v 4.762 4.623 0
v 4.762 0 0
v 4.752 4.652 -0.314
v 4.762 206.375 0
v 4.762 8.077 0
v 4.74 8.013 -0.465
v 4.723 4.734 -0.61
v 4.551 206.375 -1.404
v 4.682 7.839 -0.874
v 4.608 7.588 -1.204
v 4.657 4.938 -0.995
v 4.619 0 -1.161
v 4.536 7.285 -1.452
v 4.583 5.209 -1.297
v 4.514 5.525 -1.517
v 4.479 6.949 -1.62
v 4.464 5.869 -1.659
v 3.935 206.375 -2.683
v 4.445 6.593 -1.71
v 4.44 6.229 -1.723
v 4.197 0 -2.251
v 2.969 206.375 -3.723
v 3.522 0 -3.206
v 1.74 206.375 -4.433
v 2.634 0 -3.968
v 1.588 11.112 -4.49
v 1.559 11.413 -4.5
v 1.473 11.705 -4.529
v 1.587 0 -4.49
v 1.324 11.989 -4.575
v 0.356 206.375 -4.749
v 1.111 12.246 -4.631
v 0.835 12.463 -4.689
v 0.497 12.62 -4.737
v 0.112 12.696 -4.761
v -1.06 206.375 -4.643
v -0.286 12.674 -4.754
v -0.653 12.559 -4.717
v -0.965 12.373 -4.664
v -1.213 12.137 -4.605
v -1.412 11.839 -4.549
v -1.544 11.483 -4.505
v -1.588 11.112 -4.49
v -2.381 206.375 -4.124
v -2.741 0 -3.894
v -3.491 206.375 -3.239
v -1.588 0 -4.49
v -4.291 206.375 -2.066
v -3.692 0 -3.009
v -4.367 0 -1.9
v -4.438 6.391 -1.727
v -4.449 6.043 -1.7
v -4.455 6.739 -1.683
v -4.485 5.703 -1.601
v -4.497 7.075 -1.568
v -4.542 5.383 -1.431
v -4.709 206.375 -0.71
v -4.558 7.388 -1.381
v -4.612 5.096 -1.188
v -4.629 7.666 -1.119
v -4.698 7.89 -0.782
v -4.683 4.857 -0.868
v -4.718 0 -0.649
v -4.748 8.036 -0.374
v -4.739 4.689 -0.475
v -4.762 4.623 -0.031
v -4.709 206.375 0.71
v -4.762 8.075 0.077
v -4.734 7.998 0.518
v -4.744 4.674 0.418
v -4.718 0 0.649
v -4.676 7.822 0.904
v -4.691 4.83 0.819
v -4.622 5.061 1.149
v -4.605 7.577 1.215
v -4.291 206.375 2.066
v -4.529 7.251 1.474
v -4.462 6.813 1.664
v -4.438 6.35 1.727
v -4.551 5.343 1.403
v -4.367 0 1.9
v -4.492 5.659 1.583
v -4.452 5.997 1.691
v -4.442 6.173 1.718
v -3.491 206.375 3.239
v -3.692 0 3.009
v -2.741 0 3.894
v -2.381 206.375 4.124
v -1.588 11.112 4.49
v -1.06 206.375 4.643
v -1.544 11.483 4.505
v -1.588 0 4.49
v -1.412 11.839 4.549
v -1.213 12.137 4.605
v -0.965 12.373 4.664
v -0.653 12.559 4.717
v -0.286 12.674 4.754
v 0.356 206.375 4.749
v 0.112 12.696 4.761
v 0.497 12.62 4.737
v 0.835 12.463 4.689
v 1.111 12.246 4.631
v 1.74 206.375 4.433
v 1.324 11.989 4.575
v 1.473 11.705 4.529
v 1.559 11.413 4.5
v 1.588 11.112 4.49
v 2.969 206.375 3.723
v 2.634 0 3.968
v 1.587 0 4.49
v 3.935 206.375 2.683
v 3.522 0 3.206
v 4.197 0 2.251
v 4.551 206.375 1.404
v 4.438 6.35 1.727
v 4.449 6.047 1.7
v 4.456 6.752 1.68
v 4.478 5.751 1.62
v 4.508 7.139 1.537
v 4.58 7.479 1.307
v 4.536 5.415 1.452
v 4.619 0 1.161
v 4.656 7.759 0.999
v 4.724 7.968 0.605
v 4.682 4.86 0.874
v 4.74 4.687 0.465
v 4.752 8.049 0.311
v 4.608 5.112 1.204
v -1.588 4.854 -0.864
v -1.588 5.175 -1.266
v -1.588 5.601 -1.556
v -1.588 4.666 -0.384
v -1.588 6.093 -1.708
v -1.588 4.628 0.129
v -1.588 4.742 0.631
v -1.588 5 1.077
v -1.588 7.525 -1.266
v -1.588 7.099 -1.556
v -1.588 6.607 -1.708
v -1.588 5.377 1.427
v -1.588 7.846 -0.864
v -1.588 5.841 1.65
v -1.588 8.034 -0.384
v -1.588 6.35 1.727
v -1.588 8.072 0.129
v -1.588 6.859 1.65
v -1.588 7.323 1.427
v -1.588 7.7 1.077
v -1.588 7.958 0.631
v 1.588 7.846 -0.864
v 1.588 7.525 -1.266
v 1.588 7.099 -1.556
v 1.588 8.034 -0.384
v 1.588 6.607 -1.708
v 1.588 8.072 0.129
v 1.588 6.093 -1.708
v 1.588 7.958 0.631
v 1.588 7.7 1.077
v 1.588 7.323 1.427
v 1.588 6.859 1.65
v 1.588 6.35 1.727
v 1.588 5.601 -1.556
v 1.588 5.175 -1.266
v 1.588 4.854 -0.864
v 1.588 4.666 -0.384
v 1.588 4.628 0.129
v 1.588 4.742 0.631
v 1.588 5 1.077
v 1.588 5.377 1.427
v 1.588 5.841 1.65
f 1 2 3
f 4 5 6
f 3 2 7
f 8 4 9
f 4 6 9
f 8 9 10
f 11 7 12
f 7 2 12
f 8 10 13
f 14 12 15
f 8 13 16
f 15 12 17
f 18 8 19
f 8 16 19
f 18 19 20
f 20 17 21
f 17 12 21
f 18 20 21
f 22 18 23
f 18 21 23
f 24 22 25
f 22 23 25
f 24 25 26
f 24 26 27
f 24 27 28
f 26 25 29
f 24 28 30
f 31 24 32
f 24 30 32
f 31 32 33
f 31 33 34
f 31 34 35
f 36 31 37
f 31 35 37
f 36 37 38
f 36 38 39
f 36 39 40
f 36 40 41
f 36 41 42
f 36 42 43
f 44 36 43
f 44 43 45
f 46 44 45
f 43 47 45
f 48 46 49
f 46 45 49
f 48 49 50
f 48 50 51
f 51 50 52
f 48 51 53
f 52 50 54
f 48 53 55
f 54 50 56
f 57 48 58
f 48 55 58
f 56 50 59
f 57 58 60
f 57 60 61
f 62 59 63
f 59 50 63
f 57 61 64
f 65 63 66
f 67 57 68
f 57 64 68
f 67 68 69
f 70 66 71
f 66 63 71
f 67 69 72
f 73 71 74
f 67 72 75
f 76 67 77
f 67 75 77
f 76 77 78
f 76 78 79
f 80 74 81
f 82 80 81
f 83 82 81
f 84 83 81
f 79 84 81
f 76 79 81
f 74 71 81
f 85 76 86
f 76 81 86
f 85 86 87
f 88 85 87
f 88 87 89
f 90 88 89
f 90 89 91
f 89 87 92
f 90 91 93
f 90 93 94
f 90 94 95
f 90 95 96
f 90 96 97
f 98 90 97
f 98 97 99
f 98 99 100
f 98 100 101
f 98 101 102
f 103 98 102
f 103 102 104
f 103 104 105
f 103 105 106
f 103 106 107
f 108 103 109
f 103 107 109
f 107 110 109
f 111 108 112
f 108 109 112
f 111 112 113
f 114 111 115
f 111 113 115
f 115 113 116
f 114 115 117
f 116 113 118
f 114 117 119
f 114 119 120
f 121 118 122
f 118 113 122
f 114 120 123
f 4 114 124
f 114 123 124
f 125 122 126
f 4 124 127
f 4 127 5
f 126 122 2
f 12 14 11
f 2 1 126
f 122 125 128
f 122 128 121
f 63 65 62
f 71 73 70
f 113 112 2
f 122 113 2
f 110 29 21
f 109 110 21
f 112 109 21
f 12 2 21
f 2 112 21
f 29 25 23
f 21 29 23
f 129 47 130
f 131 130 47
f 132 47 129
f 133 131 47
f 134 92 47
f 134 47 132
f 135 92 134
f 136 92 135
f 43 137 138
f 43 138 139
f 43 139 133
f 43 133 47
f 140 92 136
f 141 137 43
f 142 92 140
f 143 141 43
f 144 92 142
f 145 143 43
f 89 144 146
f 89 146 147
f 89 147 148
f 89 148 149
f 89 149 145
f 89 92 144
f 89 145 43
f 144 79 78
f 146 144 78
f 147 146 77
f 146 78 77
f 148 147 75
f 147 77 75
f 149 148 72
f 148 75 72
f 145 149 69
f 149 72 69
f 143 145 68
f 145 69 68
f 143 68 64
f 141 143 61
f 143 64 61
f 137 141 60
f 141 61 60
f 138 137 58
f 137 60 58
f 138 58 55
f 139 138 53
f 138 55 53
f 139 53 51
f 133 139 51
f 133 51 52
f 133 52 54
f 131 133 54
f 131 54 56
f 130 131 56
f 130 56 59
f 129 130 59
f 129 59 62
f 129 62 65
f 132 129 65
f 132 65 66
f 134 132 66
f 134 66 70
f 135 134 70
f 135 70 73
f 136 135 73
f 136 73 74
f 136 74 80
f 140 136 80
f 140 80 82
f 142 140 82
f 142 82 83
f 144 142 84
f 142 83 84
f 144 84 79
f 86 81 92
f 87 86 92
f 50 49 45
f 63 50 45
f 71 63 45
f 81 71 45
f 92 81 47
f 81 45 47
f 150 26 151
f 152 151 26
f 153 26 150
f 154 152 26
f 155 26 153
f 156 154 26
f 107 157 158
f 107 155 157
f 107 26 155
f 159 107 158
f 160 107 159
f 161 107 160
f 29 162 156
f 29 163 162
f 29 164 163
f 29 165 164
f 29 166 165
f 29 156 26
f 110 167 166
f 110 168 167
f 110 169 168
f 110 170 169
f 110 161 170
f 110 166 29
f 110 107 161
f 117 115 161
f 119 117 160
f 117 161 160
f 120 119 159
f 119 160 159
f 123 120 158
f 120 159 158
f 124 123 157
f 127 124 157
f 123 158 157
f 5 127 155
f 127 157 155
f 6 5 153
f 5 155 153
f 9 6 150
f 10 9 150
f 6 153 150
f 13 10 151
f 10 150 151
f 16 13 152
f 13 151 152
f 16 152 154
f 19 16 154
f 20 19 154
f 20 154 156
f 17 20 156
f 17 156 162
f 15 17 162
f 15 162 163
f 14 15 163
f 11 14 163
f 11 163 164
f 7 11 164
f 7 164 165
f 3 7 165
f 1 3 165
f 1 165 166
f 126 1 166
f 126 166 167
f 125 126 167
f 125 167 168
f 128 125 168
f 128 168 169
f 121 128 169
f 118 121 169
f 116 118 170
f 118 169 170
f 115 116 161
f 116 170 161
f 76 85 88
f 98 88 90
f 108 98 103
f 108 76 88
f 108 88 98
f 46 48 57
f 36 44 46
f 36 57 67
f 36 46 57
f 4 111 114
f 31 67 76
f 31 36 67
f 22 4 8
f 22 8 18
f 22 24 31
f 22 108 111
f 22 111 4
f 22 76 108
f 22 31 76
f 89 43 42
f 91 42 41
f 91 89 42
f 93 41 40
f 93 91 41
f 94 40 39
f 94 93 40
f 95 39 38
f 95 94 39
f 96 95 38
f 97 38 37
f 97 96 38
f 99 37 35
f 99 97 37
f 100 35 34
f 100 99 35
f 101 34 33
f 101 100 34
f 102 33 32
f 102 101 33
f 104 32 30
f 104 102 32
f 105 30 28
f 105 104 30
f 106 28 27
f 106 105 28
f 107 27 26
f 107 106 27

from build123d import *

# Parameters (mm, degrees)
SKETCH1_R               = 4.7625
BOSS_EXTRUDE1_DEPTH     = 206.375
CUT_EXTRUDE1_DEPTH      = 5.7625
CUT_EXTRUDE1_DEPTH_BACK = 5.7625
F_8_32_TAPPED_HOLE1_D   = 3.4544


with BuildPart() as part:
    # Sketch1 → Boss-Extrude1 (new body)
    with BuildSketch(Plane(origin=(0, 0, 0), x_dir=(1, 0, 0), z_dir=(0, 1, 0))):
        Circle(SKETCH1_R)
    extrude(amount=BOSS_EXTRUDE1_DEPTH)

    # Sketch2 → Cut-Extrude1 (cut, two sides)
    with BuildSketch(Plane.XY) as cut_extrude1_sk:
        with BuildLine():
            Line((-1.5875, -11.1125), (-1.5875, 11.1125))
            ThreePointArc((-1.5875, 11.1125), (0, 12.7), (1.5875, 11.1125))
            Line((1.5875, 11.1125), (1.5875, -11.1125))
            ThreePointArc((1.5875, -11.1125), (0, -12.7), (-1.5875, -11.1125))
        make_face()
    extrude(amount=CUT_EXTRUDE1_DEPTH, mode=Mode.SUBTRACT)
    extrude(cut_extrude1_sk.sketch, amount=-CUT_EXTRUDE1_DEPTH_BACK, mode=Mode.SUBTRACT)

    # #8-32 Tapped Hole1 (through all)
    with Locations(Plane(origin=(4.7625, 0, 0), x_dir=(0, 0, -1), z_dir=(1, 0, 0))):
        with Locations((0, 6.35)):
            Hole(F_8_32_TAPPED_HOLE1_D / 2)


solid = part.part
